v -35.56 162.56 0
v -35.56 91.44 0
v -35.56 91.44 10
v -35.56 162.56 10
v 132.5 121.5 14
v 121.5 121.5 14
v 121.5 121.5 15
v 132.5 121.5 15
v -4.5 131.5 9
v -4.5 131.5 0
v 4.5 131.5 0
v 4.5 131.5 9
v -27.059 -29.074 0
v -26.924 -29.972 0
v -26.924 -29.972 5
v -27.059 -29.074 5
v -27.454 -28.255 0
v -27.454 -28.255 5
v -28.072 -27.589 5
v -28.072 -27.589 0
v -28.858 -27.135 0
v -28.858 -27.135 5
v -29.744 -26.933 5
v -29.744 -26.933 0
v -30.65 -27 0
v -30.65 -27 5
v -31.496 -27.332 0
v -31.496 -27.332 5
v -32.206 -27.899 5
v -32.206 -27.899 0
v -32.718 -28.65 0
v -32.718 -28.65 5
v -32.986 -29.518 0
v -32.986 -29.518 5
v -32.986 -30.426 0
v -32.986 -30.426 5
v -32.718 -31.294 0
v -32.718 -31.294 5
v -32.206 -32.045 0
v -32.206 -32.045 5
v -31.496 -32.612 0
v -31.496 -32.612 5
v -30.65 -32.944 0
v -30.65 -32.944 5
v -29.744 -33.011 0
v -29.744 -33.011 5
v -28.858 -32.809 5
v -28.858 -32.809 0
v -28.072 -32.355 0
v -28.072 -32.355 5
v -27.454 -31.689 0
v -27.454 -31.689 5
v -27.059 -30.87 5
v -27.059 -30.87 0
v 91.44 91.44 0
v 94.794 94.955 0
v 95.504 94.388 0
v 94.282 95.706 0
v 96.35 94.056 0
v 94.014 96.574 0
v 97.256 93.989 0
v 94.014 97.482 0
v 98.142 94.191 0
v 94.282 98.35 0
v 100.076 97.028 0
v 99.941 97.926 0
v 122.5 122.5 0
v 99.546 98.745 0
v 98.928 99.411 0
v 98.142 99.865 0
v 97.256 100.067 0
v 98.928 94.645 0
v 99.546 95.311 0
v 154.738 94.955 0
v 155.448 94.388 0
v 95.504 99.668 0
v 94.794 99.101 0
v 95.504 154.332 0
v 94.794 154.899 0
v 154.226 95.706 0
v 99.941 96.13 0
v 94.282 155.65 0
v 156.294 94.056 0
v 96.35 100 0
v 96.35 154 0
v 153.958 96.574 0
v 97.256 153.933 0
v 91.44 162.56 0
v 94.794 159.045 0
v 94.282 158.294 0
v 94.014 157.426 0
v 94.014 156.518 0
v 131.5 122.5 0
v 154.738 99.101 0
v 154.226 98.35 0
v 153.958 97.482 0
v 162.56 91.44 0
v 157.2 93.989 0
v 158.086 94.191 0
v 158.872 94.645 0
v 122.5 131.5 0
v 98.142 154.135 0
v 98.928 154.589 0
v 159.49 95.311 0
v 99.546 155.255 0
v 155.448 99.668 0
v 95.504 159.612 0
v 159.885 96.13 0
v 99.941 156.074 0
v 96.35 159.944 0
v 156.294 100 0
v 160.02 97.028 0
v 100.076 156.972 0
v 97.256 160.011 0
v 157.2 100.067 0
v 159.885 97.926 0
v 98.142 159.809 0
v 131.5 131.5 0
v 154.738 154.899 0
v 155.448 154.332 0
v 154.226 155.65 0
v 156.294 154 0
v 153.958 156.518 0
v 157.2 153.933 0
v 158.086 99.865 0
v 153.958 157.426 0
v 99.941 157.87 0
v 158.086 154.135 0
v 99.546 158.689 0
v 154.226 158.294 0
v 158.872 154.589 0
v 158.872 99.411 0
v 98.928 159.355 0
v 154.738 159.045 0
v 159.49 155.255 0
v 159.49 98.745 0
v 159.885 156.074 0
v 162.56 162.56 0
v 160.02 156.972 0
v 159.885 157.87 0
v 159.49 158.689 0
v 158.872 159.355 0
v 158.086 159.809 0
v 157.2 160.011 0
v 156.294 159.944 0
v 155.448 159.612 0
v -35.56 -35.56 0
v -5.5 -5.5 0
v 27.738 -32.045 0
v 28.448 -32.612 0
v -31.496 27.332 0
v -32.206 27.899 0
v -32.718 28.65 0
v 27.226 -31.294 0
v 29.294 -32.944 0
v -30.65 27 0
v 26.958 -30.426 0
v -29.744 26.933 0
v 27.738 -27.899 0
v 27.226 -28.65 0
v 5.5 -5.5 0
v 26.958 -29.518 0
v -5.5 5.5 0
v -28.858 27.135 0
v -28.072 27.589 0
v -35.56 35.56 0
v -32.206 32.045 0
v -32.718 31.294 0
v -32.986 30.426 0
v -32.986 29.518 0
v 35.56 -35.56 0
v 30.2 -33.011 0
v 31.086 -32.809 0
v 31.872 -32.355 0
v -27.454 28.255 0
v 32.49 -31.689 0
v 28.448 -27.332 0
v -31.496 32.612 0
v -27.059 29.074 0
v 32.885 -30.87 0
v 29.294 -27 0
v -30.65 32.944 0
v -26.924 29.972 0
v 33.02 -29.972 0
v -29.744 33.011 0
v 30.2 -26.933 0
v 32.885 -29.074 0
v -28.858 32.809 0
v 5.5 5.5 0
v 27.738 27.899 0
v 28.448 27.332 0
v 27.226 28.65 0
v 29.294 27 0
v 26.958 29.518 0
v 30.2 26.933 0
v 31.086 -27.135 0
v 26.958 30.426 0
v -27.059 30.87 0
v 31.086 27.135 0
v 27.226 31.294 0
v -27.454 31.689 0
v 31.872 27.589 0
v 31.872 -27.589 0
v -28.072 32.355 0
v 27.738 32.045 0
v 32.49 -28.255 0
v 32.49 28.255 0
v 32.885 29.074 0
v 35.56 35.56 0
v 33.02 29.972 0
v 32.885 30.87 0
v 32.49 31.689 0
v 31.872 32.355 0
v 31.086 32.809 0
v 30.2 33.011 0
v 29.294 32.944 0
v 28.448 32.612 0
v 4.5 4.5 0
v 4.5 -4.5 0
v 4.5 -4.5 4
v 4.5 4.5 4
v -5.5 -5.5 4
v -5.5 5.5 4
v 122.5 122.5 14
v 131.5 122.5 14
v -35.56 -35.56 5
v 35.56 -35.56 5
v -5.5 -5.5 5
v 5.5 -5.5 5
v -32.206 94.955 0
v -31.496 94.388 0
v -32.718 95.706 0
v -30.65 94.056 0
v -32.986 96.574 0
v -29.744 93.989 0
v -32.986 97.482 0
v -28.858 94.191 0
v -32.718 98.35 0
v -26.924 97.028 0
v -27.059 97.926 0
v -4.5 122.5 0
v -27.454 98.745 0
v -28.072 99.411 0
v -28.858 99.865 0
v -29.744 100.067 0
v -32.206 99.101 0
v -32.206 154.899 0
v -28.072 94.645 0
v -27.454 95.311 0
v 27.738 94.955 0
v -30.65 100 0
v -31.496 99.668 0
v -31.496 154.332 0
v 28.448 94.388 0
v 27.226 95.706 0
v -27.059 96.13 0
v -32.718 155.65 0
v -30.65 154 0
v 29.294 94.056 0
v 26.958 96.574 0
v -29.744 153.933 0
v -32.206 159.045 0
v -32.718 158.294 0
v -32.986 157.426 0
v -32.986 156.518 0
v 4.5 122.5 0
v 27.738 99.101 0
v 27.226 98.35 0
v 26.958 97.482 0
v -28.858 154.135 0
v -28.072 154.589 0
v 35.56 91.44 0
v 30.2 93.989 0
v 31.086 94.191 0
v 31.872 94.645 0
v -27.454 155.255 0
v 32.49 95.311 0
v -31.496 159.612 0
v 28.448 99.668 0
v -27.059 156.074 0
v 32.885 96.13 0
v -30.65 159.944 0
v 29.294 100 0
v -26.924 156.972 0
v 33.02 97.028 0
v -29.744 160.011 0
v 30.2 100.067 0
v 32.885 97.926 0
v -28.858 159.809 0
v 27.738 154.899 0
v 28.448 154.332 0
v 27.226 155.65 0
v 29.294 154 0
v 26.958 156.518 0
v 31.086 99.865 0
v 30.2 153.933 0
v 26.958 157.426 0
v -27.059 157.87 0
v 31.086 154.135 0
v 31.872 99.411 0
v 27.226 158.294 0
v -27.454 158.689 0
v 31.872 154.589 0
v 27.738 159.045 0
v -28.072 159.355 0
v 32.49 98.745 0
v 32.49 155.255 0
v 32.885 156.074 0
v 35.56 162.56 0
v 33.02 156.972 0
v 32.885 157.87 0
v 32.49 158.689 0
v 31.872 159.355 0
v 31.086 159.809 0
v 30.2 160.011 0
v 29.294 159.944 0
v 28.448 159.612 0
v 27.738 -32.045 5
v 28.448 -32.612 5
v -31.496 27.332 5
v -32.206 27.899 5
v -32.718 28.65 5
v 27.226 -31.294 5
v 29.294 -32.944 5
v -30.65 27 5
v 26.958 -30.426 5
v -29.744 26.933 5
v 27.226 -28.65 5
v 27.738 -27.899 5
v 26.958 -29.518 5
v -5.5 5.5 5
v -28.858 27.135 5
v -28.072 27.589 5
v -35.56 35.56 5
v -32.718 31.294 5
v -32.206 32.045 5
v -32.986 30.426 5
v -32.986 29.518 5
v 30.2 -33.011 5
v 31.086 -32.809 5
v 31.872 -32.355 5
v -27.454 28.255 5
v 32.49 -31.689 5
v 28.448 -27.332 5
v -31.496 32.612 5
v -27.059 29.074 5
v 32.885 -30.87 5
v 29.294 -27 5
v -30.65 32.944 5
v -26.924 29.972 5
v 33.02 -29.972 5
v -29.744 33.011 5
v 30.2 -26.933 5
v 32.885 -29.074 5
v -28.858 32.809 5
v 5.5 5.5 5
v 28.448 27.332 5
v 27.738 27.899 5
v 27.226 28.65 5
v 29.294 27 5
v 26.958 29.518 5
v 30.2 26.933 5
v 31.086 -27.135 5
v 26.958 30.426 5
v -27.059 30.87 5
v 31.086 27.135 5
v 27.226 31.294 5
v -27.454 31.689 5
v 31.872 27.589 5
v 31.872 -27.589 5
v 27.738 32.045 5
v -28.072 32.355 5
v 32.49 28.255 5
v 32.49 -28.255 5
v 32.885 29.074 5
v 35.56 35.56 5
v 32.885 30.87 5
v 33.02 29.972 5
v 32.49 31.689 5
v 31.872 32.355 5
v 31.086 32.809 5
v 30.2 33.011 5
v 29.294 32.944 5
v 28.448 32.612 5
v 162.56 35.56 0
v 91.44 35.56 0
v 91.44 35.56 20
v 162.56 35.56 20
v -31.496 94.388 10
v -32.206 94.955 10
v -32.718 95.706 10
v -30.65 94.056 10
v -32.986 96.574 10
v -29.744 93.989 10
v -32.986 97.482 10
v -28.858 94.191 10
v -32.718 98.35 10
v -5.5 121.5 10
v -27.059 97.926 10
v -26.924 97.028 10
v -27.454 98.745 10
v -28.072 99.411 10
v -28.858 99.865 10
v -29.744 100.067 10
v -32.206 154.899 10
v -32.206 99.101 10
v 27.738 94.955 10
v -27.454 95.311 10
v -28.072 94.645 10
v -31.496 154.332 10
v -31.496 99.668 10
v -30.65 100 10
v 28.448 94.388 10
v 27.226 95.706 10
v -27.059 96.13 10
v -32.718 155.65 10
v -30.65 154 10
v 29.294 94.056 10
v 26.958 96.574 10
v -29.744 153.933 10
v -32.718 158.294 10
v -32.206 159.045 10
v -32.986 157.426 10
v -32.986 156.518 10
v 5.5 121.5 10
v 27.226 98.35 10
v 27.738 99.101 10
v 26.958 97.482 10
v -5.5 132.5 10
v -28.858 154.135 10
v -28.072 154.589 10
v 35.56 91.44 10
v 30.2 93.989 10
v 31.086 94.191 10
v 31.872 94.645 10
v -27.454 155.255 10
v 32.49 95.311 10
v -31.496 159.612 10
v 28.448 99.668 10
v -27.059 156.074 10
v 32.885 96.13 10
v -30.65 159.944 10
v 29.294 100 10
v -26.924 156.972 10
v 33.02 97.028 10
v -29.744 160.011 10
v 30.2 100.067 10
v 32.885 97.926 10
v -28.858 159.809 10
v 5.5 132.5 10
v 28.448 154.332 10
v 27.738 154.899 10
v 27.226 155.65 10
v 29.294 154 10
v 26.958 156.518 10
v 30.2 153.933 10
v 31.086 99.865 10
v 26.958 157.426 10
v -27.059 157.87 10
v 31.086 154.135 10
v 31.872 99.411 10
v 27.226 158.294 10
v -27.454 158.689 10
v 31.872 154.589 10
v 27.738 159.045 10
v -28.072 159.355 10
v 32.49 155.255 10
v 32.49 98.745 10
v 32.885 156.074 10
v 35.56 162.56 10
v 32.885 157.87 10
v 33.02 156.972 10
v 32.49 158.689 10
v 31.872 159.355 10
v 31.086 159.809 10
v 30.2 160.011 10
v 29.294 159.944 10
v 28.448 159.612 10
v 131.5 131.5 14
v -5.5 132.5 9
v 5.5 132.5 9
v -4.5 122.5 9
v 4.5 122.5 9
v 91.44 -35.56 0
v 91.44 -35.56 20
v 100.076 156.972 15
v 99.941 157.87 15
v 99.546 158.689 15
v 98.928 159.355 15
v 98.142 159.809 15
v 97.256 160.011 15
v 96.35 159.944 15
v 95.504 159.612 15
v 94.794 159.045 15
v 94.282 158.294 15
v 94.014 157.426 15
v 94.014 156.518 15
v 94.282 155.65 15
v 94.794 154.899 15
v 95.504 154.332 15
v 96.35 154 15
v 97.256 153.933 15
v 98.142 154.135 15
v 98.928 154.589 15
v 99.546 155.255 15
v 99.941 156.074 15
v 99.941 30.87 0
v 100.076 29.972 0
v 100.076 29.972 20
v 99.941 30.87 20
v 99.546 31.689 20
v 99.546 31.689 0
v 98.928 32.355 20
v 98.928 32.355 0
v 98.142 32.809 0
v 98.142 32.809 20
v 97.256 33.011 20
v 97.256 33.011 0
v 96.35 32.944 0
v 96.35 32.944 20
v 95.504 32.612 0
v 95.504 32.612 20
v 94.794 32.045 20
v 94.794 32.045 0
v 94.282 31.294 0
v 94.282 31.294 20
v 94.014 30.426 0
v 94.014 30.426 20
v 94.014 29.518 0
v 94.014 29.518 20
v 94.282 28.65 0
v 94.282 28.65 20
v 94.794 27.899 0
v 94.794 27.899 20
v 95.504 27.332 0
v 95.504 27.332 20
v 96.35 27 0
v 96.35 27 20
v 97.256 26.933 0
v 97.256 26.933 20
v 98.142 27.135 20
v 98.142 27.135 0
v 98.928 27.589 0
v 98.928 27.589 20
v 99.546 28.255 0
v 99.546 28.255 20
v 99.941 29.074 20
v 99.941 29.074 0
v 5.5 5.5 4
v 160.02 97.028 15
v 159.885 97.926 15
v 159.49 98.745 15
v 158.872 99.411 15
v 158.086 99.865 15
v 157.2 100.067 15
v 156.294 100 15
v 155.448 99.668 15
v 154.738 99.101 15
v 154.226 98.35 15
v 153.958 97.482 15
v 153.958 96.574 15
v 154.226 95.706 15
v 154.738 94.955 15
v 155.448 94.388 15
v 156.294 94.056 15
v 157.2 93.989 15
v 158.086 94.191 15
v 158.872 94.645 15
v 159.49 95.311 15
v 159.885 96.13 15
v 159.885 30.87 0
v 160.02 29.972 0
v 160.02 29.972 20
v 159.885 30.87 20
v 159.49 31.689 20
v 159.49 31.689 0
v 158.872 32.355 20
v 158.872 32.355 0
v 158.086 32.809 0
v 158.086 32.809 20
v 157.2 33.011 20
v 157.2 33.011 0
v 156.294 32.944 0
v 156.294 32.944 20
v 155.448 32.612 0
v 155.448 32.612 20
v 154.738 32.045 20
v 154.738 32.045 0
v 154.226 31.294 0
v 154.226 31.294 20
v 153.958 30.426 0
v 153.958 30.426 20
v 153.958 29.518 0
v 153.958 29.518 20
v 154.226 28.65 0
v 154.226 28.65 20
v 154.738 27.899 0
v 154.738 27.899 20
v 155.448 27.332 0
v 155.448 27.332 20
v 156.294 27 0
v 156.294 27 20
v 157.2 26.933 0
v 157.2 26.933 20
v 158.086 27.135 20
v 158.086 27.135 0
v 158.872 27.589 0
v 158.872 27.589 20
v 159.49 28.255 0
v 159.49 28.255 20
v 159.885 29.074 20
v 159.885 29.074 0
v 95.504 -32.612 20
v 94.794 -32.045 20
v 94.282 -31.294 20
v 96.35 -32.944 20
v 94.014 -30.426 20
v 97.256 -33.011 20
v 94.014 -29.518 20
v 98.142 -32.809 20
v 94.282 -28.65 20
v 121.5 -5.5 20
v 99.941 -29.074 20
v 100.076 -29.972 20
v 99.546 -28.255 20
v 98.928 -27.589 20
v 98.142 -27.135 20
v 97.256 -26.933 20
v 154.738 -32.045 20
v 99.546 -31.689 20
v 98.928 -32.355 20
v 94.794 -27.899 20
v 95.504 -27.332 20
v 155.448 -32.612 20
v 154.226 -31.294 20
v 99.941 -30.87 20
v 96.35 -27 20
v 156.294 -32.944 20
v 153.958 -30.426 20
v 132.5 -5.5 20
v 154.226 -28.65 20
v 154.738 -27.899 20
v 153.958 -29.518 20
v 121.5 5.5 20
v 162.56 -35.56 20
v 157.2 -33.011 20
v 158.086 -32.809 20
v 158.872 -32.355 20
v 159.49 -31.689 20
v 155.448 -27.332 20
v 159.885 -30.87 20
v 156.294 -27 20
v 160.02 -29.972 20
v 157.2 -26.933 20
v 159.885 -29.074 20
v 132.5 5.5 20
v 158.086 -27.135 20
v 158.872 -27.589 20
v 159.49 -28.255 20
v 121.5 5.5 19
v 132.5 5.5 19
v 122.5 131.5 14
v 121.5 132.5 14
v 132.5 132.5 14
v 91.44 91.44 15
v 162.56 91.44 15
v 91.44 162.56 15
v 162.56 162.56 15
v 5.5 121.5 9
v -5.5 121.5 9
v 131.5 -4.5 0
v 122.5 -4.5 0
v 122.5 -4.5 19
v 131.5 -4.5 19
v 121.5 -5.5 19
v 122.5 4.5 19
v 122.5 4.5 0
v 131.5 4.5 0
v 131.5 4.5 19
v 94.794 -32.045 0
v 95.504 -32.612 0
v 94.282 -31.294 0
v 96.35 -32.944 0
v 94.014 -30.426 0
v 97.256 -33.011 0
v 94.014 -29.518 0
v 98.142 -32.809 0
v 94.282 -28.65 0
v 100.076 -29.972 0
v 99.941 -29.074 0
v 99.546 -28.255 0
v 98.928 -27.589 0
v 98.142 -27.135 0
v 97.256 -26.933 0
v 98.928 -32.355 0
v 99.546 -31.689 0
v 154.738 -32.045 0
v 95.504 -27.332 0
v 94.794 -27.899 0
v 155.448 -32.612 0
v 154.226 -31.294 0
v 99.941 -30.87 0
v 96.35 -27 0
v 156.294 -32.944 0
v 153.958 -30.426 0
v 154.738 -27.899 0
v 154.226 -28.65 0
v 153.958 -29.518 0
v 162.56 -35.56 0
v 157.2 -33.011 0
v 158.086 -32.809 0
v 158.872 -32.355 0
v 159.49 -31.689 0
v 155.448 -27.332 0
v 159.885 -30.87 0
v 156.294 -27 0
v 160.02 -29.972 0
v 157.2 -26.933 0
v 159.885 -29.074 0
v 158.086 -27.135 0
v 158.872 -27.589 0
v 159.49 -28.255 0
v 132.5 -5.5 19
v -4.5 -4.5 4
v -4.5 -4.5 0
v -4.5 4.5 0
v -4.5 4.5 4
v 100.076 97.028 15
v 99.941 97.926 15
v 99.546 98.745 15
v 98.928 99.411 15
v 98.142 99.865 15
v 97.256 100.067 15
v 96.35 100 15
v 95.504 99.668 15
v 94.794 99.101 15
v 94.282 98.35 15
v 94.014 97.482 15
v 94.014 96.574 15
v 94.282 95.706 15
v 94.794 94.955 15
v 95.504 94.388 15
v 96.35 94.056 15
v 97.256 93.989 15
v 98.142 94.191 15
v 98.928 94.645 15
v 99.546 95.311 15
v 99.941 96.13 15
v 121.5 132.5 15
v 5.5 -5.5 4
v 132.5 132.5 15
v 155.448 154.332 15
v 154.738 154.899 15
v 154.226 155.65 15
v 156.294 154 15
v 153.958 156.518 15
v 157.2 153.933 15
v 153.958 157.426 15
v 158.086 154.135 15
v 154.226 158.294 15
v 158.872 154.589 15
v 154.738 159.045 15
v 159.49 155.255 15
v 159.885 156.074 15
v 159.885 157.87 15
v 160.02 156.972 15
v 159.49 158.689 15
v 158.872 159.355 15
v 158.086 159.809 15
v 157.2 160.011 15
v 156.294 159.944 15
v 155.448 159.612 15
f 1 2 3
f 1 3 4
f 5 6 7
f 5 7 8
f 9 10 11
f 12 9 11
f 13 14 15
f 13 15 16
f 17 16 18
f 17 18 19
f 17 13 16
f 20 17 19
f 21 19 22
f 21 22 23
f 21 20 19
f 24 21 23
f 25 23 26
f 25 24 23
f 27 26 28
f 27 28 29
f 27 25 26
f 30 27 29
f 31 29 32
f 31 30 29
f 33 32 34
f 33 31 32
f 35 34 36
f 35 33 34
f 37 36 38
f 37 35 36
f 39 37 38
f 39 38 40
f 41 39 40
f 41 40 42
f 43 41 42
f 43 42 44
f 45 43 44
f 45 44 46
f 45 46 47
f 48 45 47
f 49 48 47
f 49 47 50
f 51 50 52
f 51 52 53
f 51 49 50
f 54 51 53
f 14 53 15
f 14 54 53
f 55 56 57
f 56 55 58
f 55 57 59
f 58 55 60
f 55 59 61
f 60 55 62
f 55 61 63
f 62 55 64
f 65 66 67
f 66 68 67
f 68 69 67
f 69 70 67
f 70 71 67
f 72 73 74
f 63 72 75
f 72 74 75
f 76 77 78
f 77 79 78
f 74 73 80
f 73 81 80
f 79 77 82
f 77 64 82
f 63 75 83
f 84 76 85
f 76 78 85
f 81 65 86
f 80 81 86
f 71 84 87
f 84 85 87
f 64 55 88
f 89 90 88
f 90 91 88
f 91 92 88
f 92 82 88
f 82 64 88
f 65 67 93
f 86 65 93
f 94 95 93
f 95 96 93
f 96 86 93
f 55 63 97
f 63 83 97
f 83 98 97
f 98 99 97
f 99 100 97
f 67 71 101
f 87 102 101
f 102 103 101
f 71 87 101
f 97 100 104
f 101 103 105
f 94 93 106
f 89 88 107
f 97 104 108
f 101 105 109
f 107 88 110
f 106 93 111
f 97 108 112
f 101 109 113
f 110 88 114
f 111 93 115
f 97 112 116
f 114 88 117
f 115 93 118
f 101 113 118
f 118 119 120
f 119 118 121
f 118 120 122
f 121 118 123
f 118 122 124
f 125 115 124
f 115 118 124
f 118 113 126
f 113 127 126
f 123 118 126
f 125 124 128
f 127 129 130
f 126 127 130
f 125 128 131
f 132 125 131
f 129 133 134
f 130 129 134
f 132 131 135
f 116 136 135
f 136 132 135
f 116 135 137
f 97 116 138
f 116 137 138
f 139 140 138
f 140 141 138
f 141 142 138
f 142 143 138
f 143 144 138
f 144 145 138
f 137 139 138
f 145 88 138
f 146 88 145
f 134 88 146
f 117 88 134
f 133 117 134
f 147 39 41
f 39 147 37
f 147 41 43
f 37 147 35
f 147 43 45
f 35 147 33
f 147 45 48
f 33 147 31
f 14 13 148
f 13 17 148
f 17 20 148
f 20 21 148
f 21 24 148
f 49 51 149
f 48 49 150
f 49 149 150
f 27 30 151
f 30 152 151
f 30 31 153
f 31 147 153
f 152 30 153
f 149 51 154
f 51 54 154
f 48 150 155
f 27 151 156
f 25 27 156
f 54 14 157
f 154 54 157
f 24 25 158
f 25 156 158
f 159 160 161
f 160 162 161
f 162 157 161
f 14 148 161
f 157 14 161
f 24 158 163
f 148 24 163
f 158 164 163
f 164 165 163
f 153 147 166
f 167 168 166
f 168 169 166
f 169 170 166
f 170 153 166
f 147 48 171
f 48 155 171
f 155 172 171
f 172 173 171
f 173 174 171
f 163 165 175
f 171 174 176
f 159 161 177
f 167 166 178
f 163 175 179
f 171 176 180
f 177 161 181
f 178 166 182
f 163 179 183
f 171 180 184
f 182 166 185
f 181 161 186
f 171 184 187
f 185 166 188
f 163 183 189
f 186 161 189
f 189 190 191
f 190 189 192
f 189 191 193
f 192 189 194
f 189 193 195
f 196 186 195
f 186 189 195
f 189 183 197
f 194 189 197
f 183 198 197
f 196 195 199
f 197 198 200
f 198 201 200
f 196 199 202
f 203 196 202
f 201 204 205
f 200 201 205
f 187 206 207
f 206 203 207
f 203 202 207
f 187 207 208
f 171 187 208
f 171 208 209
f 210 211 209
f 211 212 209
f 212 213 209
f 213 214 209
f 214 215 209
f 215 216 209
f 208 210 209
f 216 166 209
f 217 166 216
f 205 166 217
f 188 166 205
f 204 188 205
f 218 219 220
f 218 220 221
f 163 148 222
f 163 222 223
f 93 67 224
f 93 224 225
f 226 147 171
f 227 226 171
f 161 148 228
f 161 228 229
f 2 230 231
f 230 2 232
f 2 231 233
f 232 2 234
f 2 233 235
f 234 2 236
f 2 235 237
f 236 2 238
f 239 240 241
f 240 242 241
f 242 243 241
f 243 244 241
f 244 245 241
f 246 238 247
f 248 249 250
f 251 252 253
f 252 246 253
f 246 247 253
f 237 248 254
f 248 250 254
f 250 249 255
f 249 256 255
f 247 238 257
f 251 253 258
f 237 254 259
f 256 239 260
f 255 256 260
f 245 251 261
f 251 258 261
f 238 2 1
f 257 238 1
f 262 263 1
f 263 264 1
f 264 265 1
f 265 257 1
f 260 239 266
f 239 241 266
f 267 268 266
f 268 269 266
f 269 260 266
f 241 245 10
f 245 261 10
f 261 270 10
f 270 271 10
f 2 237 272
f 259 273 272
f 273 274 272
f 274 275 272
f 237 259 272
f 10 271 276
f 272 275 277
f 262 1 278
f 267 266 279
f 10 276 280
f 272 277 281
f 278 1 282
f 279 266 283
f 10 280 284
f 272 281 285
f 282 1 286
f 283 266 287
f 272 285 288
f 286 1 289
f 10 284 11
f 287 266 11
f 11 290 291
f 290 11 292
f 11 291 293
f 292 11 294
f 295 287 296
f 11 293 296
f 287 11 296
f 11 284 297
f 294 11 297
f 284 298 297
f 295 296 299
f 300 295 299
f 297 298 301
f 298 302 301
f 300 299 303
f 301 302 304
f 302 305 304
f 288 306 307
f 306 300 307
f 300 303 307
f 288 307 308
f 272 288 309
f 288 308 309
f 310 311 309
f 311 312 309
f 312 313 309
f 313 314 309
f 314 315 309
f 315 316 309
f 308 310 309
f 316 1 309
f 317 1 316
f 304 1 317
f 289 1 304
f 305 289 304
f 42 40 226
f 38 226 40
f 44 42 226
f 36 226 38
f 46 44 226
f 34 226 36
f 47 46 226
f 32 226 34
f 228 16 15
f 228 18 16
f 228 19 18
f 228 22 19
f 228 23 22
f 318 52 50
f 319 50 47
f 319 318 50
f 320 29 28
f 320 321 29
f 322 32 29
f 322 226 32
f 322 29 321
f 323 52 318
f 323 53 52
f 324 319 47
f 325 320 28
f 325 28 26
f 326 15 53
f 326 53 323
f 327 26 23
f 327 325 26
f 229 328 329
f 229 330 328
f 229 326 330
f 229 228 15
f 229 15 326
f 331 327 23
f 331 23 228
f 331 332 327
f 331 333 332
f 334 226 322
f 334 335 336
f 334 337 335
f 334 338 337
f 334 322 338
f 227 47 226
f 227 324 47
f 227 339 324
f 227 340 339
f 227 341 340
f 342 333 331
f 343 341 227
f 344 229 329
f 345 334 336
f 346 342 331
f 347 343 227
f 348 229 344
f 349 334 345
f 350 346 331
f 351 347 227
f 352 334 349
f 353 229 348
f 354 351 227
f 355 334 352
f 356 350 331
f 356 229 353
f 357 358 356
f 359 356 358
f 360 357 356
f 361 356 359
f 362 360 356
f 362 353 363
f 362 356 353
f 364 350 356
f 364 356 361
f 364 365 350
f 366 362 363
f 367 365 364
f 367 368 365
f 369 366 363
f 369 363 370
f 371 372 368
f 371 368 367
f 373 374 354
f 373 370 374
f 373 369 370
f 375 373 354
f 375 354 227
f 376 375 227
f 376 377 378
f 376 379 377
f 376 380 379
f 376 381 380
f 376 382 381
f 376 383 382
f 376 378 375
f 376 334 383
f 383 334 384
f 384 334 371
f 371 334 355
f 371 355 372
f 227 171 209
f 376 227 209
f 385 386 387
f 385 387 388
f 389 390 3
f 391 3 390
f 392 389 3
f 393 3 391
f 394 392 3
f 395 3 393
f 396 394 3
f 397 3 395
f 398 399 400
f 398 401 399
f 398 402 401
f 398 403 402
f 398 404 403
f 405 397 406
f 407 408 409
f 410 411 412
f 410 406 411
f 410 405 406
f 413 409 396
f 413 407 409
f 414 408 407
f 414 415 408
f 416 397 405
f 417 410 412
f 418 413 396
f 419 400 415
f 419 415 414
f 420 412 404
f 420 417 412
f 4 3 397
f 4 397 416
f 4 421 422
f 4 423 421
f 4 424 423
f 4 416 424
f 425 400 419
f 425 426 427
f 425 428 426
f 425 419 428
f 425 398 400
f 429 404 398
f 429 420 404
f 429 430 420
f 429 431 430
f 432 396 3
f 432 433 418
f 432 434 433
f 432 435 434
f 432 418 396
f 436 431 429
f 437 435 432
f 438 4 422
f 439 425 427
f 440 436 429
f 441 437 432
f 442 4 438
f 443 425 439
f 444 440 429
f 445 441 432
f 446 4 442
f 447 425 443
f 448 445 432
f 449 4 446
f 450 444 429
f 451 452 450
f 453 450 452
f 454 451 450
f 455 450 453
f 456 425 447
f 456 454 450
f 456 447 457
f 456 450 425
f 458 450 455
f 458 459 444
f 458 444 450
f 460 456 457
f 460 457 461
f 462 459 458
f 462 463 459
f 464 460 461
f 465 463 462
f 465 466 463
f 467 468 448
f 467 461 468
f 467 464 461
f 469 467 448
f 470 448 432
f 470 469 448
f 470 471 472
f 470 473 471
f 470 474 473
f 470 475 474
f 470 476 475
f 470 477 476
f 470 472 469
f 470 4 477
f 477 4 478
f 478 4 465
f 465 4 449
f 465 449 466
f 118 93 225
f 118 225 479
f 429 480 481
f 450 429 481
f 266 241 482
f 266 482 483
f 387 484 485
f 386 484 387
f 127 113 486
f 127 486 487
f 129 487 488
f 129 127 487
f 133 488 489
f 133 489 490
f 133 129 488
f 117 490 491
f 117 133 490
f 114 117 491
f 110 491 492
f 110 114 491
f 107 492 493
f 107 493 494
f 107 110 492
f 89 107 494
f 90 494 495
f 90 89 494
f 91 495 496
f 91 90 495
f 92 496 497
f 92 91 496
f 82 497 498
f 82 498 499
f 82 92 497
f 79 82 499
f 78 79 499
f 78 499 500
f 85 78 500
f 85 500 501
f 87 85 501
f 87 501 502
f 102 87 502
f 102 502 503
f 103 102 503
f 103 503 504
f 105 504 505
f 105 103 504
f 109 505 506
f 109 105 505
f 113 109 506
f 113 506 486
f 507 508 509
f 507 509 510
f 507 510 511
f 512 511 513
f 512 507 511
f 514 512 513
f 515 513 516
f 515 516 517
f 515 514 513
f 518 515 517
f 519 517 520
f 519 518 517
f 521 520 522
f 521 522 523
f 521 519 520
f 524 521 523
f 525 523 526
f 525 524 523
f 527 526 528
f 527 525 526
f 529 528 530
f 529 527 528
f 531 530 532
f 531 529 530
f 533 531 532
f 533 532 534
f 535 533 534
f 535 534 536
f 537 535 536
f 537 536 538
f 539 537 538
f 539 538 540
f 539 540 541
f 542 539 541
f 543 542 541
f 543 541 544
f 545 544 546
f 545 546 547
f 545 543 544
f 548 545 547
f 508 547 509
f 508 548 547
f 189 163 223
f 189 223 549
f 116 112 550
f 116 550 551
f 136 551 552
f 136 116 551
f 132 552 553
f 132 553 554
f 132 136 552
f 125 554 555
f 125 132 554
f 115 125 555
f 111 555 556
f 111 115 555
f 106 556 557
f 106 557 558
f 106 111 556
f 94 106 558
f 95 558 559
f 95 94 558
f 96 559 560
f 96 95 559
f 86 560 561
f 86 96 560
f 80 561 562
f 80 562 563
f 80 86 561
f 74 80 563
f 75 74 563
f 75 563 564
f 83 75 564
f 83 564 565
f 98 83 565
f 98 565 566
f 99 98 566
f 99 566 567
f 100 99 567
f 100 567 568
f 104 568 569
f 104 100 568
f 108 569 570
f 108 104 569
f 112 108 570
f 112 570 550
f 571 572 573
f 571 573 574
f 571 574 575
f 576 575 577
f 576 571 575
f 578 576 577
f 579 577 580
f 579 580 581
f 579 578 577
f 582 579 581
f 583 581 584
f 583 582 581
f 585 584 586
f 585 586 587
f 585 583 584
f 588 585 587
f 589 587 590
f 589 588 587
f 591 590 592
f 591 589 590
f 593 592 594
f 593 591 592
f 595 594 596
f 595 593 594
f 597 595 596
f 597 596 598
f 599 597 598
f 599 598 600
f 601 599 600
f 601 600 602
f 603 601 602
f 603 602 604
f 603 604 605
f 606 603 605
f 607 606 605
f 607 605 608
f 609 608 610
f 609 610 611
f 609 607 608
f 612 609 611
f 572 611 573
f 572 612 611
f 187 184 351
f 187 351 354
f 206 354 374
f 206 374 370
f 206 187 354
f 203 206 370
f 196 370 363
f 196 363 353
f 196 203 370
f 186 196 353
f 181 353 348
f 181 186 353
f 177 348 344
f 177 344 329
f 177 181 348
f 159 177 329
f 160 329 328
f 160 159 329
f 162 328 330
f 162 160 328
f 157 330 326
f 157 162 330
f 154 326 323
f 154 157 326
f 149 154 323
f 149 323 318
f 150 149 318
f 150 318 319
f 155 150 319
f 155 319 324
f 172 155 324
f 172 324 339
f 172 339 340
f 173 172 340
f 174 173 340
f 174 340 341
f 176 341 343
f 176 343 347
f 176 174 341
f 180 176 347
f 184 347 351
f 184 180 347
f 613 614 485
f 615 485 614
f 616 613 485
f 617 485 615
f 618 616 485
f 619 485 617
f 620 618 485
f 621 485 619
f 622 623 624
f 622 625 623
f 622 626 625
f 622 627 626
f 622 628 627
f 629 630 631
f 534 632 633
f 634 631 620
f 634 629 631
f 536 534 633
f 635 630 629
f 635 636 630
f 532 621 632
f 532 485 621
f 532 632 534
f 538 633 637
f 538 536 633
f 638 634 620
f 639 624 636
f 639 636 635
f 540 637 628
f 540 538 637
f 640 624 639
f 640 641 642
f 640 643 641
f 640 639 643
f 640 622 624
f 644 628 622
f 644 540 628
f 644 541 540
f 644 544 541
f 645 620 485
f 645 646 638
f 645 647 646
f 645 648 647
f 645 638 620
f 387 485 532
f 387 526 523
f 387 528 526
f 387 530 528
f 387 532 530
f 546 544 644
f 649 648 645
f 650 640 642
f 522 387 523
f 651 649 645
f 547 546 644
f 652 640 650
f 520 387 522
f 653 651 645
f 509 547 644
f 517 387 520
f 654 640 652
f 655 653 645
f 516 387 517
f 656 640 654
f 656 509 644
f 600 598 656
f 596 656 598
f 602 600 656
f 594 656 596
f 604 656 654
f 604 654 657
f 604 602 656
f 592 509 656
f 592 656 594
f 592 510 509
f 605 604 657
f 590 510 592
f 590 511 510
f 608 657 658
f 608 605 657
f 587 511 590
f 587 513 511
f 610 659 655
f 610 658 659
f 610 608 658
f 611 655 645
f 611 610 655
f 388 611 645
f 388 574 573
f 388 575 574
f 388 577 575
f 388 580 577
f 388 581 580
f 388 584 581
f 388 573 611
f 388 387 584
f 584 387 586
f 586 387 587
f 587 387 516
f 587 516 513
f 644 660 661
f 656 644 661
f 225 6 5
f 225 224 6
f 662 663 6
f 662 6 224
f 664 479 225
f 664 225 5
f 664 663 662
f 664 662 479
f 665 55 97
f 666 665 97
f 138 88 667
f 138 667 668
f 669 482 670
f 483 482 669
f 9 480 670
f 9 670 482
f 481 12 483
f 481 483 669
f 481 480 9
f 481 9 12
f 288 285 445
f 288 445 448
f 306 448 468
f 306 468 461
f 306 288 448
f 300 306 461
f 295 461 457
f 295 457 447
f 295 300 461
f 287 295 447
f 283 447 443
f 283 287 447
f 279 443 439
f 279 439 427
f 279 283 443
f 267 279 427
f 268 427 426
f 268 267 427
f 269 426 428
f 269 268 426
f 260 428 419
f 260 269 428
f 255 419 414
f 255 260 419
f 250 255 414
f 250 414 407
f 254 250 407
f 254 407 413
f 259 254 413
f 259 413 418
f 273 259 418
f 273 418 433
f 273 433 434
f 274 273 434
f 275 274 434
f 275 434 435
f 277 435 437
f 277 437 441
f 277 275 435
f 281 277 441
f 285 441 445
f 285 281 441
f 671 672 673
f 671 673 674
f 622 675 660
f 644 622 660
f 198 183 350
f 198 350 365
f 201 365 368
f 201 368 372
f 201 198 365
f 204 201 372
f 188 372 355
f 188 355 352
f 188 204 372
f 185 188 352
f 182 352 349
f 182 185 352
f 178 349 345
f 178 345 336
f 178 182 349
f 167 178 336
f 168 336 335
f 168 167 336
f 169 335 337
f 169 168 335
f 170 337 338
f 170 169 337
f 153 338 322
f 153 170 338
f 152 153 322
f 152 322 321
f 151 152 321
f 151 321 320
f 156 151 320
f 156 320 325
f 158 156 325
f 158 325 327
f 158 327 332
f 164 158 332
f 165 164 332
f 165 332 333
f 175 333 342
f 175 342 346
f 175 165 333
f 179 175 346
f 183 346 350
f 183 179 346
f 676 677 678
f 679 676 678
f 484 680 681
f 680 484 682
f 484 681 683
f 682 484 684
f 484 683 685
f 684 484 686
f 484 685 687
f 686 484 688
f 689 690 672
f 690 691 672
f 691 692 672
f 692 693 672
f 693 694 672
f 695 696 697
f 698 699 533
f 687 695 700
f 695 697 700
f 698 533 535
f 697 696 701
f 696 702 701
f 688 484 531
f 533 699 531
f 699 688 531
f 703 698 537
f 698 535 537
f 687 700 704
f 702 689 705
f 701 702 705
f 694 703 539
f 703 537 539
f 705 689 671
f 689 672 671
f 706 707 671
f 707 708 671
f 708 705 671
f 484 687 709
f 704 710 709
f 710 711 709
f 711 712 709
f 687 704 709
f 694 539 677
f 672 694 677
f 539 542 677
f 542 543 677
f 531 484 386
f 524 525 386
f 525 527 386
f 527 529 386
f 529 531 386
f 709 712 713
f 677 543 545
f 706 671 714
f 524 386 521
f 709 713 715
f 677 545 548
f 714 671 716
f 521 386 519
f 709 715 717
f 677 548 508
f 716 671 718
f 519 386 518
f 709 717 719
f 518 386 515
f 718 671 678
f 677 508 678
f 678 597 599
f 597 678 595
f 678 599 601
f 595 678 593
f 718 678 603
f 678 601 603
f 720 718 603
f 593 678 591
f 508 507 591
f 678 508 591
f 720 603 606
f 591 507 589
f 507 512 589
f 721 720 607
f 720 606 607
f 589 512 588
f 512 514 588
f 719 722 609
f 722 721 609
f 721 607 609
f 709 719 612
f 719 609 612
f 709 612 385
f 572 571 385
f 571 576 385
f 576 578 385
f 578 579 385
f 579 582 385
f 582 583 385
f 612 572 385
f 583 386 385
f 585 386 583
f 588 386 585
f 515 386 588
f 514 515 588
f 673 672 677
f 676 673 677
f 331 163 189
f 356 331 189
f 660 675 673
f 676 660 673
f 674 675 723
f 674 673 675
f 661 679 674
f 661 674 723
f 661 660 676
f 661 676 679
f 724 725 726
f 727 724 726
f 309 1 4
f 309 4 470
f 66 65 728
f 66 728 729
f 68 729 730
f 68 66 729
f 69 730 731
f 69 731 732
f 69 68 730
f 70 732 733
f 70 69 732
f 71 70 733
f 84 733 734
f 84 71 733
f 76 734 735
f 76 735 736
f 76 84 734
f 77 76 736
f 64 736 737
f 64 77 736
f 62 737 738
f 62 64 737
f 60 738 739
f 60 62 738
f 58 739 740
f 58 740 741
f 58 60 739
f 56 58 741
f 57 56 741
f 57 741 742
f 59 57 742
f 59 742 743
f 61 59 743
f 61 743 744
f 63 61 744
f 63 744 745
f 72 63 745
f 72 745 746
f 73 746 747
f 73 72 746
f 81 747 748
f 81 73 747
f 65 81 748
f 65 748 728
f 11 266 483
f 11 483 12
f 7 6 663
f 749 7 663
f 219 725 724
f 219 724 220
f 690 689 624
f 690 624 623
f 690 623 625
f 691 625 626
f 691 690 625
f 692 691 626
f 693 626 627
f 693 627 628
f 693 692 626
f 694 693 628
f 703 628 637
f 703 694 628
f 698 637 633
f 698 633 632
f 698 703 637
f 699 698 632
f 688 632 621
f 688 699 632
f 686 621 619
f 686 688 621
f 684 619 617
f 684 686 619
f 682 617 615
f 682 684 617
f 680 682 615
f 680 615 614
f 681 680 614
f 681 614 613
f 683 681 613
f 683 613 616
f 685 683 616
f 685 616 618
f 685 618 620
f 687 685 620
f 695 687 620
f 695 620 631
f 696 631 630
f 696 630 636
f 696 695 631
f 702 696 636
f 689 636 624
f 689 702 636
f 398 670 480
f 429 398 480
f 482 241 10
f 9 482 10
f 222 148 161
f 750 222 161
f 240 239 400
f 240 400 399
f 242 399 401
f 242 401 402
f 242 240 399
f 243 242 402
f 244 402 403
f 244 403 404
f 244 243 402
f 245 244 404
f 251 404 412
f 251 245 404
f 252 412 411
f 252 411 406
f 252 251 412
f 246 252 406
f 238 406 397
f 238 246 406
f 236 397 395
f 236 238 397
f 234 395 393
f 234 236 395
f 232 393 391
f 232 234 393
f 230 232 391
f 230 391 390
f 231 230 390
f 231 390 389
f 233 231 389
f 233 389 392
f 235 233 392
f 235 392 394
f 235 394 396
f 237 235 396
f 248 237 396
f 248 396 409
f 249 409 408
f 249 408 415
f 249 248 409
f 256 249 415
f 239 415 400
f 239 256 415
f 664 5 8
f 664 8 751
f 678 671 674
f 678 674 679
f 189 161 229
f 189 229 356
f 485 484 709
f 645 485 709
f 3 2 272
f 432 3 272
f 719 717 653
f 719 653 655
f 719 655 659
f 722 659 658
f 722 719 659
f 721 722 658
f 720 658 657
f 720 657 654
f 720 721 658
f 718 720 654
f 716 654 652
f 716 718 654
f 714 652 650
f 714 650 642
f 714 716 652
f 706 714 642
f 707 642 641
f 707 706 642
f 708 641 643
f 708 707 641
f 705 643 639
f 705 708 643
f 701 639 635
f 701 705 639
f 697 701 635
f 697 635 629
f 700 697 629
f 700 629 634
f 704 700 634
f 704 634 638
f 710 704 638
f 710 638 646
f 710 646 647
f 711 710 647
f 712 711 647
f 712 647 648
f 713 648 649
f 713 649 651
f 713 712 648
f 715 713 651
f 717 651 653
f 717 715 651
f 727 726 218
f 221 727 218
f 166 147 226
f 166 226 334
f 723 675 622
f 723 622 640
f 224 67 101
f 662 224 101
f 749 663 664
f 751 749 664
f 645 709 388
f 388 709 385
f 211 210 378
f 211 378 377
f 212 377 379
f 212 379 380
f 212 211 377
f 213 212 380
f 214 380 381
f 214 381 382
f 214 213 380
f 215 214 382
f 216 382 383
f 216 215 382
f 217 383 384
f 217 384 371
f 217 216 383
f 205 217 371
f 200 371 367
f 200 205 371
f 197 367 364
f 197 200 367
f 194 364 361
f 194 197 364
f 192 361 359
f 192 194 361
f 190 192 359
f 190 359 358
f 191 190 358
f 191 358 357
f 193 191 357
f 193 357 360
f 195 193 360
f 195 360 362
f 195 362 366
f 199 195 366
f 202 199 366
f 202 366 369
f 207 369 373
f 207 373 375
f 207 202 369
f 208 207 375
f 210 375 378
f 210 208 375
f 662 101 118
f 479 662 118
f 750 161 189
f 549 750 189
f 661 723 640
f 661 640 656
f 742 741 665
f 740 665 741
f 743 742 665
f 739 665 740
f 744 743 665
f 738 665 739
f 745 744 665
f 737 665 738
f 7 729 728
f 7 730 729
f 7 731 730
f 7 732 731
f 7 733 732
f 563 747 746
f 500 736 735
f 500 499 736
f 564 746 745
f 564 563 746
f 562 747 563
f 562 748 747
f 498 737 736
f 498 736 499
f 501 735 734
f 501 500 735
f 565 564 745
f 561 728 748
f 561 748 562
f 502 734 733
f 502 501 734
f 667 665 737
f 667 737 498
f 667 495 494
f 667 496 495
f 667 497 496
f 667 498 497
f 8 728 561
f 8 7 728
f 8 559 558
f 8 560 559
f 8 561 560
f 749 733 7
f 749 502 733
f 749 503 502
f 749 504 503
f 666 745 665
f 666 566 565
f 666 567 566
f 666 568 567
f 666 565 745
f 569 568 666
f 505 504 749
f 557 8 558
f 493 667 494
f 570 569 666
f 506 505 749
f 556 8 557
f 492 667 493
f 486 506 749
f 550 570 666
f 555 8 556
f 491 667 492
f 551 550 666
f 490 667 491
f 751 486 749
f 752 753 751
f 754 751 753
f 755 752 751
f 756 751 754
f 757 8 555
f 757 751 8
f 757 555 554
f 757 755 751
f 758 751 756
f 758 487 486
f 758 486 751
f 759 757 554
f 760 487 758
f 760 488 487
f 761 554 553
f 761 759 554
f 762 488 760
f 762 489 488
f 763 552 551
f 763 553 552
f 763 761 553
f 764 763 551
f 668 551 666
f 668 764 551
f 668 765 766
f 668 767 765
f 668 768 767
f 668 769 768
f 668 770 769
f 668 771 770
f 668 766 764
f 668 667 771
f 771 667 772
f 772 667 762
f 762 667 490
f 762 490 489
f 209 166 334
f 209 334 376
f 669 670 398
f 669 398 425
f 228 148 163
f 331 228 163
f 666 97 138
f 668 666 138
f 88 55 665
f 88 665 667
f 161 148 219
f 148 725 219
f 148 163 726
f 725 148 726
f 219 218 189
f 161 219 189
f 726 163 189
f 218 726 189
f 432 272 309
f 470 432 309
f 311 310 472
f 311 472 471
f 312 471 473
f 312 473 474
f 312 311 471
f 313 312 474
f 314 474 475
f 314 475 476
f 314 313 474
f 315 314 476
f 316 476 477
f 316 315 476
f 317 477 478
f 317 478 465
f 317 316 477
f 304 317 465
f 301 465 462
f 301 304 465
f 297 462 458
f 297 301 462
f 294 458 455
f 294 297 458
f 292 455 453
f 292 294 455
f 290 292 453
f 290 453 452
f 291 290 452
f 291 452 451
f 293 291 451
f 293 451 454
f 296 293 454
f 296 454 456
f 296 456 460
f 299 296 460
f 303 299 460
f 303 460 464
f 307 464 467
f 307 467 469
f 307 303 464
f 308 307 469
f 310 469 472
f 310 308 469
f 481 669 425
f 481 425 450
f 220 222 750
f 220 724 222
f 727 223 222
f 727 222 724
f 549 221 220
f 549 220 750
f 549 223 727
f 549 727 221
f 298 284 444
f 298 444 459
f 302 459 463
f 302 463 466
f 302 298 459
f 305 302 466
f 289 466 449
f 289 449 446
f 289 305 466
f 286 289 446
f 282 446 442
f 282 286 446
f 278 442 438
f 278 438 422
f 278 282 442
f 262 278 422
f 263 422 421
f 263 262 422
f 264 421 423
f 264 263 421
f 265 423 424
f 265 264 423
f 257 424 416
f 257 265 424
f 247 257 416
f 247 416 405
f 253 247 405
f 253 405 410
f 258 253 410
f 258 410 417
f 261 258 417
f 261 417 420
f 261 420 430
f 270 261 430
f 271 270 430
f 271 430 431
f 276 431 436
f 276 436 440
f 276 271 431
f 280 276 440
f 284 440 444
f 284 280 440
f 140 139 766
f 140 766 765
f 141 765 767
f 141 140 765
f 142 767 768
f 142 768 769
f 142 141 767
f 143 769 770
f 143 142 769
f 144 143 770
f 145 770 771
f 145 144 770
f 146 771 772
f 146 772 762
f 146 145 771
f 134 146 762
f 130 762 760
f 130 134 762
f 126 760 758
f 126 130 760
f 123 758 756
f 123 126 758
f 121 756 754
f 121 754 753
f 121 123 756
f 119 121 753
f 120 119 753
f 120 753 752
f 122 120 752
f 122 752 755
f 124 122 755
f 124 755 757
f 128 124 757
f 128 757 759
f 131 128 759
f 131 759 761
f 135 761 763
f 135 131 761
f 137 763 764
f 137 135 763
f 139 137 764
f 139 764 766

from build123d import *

# Parameters (mm, degrees)
F0_W     = 71.12
F0_H     = 71.12
F0_R     = 3.048
F0_W_2   = 11
F0_H_2   = 11
F1_DEPTH = 5
F2_DEPTH = 10
F3_DEPTH = 15
F4_DEPTH = 20
F0_W_3   = 9
F0_H_3   = 9
F5_DEPTH = 4
F6_DEPTH = 9
F7_DEPTH = 14
F8_DEPTH = 19


with BuildPart() as f1:
    # F0 (on Top) → F1 (new body)
    with BuildSketch(Plane.XY):
        Rectangle(F0_W, F0_H)
        with Locations((-29.972, -29.972)):
            Circle(F0_R, mode=Mode.SUBTRACT)
        Rectangle(F0_W_2, F0_H_2, mode=Mode.SUBTRACT)
        with Locations((29.972, -29.972)):
            Circle(F0_R, mode=Mode.SUBTRACT)
        with Locations((-29.972, 29.972)):
            Circle(F0_R, mode=Mode.SUBTRACT)
        with Locations((29.972, 29.972)):
            Circle(F0_R, mode=Mode.SUBTRACT)
    extrude(amount=F1_DEPTH)


with BuildPart() as f2:
    # F0 (on Top) → F2 (new body)
    with BuildSketch(Plane.XY):
        with Locations((0, 127)):
            Rectangle(F0_W, F0_H)
        with Locations((-29.972, 97.028)):
            Circle(F0_R, mode=Mode.SUBTRACT)
        with Locations((29.972, 97.028)):
            Circle(F0_R, mode=Mode.SUBTRACT)
        with Locations((0, 127)):
            Rectangle(F0_W_2, F0_H_2, mode=Mode.SUBTRACT)
        with Locations((-29.972, 156.972)):
            Circle(F0_R, mode=Mode.SUBTRACT)
        with Locations((29.972, 156.972)):
            Circle(F0_R, mode=Mode.SUBTRACT)
    extrude(amount=F2_DEPTH)

    # F0 (on Top) → F6 (join)
    with BuildSketch(Plane.XY):
        with Locations((0, 127)):
            Rectangle(F0_W_2, F0_H_2)
        with Locations((0, 127)):
            Rectangle(F0_W_3, F0_H_3, mode=Mode.SUBTRACT)
    extrude(amount=F6_DEPTH)


with BuildPart() as f3:
    # F0 (on Top) → F3 (new body)
    with BuildSketch(Plane.XY):
        with Locations((127, 127)):
            Rectangle(F0_W, F0_H)
        with Locations((97.028, 97.028)):
            Circle(F0_R, mode=Mode.SUBTRACT)
        with Locations((156.972, 97.028)):
            Circle(F0_R, mode=Mode.SUBTRACT)
        with Locations((97.028, 156.972)):
            Circle(F0_R, mode=Mode.SUBTRACT)
        with Locations((127, 127)):
            Rectangle(F0_W_2, F0_H_2, mode=Mode.SUBTRACT)
        with Locations((156.972, 156.972)):
            Circle(F0_R, mode=Mode.SUBTRACT)
    extrude(amount=F3_DEPTH)

    # F0 (on Top) → F7 (join)
    with BuildSketch(Plane.XY):
        with Locations((127, 127)):
            Rectangle(F0_W_2, F0_H_2)
        with Locations((127, 127)):
            Rectangle(F0_W_3, F0_H_3, mode=Mode.SUBTRACT)
    extrude(amount=F7_DEPTH)


with BuildPart() as f4:
    # F0 (on Top) → F4 (new body)
    with BuildSketch(Plane.XY):
        with Locations((127, 0)):
            Rectangle(F0_W, F0_H)
        with Locations((97.028, -29.972)):
            Circle(F0_R, mode=Mode.SUBTRACT)
        with Locations((156.972, -29.972)):
            Circle(F0_R, mode=Mode.SUBTRACT)
        with Locations((127, 0)):
            Rectangle(F0_W_2, F0_H_2, mode=Mode.SUBTRACT)
        with Locations((97.028, 29.972)):
            Circle(F0_R, mode=Mode.SUBTRACT)
        with Locations((156.972, 29.972)):
            Circle(F0_R, mode=Mode.SUBTRACT)
    extrude(amount=F4_DEPTH)

    # F0 (on Top) → F8 (join)
    with BuildSketch(Plane.XY):
        with Locations((127, 0)):
            Rectangle(F0_W_2, F0_H_2)
        with Locations((127, 0)):
            Rectangle(F0_W_3, F0_H_3, mode=Mode.SUBTRACT)
    extrude(amount=F8_DEPTH)


with BuildPart() as f5:
    # F0 (on Top) → F5 (new body)
    with BuildSketch(Plane.XY):
        Rectangle(F0_W_2, F0_H_2)
        Rectangle(F0_W_3, F0_H_3, mode=Mode.SUBTRACT)
    extrude(amount=F5_DEPTH)


solid = Compound([f1.part, f2.part, f3.part, f4.part, f5.part])
